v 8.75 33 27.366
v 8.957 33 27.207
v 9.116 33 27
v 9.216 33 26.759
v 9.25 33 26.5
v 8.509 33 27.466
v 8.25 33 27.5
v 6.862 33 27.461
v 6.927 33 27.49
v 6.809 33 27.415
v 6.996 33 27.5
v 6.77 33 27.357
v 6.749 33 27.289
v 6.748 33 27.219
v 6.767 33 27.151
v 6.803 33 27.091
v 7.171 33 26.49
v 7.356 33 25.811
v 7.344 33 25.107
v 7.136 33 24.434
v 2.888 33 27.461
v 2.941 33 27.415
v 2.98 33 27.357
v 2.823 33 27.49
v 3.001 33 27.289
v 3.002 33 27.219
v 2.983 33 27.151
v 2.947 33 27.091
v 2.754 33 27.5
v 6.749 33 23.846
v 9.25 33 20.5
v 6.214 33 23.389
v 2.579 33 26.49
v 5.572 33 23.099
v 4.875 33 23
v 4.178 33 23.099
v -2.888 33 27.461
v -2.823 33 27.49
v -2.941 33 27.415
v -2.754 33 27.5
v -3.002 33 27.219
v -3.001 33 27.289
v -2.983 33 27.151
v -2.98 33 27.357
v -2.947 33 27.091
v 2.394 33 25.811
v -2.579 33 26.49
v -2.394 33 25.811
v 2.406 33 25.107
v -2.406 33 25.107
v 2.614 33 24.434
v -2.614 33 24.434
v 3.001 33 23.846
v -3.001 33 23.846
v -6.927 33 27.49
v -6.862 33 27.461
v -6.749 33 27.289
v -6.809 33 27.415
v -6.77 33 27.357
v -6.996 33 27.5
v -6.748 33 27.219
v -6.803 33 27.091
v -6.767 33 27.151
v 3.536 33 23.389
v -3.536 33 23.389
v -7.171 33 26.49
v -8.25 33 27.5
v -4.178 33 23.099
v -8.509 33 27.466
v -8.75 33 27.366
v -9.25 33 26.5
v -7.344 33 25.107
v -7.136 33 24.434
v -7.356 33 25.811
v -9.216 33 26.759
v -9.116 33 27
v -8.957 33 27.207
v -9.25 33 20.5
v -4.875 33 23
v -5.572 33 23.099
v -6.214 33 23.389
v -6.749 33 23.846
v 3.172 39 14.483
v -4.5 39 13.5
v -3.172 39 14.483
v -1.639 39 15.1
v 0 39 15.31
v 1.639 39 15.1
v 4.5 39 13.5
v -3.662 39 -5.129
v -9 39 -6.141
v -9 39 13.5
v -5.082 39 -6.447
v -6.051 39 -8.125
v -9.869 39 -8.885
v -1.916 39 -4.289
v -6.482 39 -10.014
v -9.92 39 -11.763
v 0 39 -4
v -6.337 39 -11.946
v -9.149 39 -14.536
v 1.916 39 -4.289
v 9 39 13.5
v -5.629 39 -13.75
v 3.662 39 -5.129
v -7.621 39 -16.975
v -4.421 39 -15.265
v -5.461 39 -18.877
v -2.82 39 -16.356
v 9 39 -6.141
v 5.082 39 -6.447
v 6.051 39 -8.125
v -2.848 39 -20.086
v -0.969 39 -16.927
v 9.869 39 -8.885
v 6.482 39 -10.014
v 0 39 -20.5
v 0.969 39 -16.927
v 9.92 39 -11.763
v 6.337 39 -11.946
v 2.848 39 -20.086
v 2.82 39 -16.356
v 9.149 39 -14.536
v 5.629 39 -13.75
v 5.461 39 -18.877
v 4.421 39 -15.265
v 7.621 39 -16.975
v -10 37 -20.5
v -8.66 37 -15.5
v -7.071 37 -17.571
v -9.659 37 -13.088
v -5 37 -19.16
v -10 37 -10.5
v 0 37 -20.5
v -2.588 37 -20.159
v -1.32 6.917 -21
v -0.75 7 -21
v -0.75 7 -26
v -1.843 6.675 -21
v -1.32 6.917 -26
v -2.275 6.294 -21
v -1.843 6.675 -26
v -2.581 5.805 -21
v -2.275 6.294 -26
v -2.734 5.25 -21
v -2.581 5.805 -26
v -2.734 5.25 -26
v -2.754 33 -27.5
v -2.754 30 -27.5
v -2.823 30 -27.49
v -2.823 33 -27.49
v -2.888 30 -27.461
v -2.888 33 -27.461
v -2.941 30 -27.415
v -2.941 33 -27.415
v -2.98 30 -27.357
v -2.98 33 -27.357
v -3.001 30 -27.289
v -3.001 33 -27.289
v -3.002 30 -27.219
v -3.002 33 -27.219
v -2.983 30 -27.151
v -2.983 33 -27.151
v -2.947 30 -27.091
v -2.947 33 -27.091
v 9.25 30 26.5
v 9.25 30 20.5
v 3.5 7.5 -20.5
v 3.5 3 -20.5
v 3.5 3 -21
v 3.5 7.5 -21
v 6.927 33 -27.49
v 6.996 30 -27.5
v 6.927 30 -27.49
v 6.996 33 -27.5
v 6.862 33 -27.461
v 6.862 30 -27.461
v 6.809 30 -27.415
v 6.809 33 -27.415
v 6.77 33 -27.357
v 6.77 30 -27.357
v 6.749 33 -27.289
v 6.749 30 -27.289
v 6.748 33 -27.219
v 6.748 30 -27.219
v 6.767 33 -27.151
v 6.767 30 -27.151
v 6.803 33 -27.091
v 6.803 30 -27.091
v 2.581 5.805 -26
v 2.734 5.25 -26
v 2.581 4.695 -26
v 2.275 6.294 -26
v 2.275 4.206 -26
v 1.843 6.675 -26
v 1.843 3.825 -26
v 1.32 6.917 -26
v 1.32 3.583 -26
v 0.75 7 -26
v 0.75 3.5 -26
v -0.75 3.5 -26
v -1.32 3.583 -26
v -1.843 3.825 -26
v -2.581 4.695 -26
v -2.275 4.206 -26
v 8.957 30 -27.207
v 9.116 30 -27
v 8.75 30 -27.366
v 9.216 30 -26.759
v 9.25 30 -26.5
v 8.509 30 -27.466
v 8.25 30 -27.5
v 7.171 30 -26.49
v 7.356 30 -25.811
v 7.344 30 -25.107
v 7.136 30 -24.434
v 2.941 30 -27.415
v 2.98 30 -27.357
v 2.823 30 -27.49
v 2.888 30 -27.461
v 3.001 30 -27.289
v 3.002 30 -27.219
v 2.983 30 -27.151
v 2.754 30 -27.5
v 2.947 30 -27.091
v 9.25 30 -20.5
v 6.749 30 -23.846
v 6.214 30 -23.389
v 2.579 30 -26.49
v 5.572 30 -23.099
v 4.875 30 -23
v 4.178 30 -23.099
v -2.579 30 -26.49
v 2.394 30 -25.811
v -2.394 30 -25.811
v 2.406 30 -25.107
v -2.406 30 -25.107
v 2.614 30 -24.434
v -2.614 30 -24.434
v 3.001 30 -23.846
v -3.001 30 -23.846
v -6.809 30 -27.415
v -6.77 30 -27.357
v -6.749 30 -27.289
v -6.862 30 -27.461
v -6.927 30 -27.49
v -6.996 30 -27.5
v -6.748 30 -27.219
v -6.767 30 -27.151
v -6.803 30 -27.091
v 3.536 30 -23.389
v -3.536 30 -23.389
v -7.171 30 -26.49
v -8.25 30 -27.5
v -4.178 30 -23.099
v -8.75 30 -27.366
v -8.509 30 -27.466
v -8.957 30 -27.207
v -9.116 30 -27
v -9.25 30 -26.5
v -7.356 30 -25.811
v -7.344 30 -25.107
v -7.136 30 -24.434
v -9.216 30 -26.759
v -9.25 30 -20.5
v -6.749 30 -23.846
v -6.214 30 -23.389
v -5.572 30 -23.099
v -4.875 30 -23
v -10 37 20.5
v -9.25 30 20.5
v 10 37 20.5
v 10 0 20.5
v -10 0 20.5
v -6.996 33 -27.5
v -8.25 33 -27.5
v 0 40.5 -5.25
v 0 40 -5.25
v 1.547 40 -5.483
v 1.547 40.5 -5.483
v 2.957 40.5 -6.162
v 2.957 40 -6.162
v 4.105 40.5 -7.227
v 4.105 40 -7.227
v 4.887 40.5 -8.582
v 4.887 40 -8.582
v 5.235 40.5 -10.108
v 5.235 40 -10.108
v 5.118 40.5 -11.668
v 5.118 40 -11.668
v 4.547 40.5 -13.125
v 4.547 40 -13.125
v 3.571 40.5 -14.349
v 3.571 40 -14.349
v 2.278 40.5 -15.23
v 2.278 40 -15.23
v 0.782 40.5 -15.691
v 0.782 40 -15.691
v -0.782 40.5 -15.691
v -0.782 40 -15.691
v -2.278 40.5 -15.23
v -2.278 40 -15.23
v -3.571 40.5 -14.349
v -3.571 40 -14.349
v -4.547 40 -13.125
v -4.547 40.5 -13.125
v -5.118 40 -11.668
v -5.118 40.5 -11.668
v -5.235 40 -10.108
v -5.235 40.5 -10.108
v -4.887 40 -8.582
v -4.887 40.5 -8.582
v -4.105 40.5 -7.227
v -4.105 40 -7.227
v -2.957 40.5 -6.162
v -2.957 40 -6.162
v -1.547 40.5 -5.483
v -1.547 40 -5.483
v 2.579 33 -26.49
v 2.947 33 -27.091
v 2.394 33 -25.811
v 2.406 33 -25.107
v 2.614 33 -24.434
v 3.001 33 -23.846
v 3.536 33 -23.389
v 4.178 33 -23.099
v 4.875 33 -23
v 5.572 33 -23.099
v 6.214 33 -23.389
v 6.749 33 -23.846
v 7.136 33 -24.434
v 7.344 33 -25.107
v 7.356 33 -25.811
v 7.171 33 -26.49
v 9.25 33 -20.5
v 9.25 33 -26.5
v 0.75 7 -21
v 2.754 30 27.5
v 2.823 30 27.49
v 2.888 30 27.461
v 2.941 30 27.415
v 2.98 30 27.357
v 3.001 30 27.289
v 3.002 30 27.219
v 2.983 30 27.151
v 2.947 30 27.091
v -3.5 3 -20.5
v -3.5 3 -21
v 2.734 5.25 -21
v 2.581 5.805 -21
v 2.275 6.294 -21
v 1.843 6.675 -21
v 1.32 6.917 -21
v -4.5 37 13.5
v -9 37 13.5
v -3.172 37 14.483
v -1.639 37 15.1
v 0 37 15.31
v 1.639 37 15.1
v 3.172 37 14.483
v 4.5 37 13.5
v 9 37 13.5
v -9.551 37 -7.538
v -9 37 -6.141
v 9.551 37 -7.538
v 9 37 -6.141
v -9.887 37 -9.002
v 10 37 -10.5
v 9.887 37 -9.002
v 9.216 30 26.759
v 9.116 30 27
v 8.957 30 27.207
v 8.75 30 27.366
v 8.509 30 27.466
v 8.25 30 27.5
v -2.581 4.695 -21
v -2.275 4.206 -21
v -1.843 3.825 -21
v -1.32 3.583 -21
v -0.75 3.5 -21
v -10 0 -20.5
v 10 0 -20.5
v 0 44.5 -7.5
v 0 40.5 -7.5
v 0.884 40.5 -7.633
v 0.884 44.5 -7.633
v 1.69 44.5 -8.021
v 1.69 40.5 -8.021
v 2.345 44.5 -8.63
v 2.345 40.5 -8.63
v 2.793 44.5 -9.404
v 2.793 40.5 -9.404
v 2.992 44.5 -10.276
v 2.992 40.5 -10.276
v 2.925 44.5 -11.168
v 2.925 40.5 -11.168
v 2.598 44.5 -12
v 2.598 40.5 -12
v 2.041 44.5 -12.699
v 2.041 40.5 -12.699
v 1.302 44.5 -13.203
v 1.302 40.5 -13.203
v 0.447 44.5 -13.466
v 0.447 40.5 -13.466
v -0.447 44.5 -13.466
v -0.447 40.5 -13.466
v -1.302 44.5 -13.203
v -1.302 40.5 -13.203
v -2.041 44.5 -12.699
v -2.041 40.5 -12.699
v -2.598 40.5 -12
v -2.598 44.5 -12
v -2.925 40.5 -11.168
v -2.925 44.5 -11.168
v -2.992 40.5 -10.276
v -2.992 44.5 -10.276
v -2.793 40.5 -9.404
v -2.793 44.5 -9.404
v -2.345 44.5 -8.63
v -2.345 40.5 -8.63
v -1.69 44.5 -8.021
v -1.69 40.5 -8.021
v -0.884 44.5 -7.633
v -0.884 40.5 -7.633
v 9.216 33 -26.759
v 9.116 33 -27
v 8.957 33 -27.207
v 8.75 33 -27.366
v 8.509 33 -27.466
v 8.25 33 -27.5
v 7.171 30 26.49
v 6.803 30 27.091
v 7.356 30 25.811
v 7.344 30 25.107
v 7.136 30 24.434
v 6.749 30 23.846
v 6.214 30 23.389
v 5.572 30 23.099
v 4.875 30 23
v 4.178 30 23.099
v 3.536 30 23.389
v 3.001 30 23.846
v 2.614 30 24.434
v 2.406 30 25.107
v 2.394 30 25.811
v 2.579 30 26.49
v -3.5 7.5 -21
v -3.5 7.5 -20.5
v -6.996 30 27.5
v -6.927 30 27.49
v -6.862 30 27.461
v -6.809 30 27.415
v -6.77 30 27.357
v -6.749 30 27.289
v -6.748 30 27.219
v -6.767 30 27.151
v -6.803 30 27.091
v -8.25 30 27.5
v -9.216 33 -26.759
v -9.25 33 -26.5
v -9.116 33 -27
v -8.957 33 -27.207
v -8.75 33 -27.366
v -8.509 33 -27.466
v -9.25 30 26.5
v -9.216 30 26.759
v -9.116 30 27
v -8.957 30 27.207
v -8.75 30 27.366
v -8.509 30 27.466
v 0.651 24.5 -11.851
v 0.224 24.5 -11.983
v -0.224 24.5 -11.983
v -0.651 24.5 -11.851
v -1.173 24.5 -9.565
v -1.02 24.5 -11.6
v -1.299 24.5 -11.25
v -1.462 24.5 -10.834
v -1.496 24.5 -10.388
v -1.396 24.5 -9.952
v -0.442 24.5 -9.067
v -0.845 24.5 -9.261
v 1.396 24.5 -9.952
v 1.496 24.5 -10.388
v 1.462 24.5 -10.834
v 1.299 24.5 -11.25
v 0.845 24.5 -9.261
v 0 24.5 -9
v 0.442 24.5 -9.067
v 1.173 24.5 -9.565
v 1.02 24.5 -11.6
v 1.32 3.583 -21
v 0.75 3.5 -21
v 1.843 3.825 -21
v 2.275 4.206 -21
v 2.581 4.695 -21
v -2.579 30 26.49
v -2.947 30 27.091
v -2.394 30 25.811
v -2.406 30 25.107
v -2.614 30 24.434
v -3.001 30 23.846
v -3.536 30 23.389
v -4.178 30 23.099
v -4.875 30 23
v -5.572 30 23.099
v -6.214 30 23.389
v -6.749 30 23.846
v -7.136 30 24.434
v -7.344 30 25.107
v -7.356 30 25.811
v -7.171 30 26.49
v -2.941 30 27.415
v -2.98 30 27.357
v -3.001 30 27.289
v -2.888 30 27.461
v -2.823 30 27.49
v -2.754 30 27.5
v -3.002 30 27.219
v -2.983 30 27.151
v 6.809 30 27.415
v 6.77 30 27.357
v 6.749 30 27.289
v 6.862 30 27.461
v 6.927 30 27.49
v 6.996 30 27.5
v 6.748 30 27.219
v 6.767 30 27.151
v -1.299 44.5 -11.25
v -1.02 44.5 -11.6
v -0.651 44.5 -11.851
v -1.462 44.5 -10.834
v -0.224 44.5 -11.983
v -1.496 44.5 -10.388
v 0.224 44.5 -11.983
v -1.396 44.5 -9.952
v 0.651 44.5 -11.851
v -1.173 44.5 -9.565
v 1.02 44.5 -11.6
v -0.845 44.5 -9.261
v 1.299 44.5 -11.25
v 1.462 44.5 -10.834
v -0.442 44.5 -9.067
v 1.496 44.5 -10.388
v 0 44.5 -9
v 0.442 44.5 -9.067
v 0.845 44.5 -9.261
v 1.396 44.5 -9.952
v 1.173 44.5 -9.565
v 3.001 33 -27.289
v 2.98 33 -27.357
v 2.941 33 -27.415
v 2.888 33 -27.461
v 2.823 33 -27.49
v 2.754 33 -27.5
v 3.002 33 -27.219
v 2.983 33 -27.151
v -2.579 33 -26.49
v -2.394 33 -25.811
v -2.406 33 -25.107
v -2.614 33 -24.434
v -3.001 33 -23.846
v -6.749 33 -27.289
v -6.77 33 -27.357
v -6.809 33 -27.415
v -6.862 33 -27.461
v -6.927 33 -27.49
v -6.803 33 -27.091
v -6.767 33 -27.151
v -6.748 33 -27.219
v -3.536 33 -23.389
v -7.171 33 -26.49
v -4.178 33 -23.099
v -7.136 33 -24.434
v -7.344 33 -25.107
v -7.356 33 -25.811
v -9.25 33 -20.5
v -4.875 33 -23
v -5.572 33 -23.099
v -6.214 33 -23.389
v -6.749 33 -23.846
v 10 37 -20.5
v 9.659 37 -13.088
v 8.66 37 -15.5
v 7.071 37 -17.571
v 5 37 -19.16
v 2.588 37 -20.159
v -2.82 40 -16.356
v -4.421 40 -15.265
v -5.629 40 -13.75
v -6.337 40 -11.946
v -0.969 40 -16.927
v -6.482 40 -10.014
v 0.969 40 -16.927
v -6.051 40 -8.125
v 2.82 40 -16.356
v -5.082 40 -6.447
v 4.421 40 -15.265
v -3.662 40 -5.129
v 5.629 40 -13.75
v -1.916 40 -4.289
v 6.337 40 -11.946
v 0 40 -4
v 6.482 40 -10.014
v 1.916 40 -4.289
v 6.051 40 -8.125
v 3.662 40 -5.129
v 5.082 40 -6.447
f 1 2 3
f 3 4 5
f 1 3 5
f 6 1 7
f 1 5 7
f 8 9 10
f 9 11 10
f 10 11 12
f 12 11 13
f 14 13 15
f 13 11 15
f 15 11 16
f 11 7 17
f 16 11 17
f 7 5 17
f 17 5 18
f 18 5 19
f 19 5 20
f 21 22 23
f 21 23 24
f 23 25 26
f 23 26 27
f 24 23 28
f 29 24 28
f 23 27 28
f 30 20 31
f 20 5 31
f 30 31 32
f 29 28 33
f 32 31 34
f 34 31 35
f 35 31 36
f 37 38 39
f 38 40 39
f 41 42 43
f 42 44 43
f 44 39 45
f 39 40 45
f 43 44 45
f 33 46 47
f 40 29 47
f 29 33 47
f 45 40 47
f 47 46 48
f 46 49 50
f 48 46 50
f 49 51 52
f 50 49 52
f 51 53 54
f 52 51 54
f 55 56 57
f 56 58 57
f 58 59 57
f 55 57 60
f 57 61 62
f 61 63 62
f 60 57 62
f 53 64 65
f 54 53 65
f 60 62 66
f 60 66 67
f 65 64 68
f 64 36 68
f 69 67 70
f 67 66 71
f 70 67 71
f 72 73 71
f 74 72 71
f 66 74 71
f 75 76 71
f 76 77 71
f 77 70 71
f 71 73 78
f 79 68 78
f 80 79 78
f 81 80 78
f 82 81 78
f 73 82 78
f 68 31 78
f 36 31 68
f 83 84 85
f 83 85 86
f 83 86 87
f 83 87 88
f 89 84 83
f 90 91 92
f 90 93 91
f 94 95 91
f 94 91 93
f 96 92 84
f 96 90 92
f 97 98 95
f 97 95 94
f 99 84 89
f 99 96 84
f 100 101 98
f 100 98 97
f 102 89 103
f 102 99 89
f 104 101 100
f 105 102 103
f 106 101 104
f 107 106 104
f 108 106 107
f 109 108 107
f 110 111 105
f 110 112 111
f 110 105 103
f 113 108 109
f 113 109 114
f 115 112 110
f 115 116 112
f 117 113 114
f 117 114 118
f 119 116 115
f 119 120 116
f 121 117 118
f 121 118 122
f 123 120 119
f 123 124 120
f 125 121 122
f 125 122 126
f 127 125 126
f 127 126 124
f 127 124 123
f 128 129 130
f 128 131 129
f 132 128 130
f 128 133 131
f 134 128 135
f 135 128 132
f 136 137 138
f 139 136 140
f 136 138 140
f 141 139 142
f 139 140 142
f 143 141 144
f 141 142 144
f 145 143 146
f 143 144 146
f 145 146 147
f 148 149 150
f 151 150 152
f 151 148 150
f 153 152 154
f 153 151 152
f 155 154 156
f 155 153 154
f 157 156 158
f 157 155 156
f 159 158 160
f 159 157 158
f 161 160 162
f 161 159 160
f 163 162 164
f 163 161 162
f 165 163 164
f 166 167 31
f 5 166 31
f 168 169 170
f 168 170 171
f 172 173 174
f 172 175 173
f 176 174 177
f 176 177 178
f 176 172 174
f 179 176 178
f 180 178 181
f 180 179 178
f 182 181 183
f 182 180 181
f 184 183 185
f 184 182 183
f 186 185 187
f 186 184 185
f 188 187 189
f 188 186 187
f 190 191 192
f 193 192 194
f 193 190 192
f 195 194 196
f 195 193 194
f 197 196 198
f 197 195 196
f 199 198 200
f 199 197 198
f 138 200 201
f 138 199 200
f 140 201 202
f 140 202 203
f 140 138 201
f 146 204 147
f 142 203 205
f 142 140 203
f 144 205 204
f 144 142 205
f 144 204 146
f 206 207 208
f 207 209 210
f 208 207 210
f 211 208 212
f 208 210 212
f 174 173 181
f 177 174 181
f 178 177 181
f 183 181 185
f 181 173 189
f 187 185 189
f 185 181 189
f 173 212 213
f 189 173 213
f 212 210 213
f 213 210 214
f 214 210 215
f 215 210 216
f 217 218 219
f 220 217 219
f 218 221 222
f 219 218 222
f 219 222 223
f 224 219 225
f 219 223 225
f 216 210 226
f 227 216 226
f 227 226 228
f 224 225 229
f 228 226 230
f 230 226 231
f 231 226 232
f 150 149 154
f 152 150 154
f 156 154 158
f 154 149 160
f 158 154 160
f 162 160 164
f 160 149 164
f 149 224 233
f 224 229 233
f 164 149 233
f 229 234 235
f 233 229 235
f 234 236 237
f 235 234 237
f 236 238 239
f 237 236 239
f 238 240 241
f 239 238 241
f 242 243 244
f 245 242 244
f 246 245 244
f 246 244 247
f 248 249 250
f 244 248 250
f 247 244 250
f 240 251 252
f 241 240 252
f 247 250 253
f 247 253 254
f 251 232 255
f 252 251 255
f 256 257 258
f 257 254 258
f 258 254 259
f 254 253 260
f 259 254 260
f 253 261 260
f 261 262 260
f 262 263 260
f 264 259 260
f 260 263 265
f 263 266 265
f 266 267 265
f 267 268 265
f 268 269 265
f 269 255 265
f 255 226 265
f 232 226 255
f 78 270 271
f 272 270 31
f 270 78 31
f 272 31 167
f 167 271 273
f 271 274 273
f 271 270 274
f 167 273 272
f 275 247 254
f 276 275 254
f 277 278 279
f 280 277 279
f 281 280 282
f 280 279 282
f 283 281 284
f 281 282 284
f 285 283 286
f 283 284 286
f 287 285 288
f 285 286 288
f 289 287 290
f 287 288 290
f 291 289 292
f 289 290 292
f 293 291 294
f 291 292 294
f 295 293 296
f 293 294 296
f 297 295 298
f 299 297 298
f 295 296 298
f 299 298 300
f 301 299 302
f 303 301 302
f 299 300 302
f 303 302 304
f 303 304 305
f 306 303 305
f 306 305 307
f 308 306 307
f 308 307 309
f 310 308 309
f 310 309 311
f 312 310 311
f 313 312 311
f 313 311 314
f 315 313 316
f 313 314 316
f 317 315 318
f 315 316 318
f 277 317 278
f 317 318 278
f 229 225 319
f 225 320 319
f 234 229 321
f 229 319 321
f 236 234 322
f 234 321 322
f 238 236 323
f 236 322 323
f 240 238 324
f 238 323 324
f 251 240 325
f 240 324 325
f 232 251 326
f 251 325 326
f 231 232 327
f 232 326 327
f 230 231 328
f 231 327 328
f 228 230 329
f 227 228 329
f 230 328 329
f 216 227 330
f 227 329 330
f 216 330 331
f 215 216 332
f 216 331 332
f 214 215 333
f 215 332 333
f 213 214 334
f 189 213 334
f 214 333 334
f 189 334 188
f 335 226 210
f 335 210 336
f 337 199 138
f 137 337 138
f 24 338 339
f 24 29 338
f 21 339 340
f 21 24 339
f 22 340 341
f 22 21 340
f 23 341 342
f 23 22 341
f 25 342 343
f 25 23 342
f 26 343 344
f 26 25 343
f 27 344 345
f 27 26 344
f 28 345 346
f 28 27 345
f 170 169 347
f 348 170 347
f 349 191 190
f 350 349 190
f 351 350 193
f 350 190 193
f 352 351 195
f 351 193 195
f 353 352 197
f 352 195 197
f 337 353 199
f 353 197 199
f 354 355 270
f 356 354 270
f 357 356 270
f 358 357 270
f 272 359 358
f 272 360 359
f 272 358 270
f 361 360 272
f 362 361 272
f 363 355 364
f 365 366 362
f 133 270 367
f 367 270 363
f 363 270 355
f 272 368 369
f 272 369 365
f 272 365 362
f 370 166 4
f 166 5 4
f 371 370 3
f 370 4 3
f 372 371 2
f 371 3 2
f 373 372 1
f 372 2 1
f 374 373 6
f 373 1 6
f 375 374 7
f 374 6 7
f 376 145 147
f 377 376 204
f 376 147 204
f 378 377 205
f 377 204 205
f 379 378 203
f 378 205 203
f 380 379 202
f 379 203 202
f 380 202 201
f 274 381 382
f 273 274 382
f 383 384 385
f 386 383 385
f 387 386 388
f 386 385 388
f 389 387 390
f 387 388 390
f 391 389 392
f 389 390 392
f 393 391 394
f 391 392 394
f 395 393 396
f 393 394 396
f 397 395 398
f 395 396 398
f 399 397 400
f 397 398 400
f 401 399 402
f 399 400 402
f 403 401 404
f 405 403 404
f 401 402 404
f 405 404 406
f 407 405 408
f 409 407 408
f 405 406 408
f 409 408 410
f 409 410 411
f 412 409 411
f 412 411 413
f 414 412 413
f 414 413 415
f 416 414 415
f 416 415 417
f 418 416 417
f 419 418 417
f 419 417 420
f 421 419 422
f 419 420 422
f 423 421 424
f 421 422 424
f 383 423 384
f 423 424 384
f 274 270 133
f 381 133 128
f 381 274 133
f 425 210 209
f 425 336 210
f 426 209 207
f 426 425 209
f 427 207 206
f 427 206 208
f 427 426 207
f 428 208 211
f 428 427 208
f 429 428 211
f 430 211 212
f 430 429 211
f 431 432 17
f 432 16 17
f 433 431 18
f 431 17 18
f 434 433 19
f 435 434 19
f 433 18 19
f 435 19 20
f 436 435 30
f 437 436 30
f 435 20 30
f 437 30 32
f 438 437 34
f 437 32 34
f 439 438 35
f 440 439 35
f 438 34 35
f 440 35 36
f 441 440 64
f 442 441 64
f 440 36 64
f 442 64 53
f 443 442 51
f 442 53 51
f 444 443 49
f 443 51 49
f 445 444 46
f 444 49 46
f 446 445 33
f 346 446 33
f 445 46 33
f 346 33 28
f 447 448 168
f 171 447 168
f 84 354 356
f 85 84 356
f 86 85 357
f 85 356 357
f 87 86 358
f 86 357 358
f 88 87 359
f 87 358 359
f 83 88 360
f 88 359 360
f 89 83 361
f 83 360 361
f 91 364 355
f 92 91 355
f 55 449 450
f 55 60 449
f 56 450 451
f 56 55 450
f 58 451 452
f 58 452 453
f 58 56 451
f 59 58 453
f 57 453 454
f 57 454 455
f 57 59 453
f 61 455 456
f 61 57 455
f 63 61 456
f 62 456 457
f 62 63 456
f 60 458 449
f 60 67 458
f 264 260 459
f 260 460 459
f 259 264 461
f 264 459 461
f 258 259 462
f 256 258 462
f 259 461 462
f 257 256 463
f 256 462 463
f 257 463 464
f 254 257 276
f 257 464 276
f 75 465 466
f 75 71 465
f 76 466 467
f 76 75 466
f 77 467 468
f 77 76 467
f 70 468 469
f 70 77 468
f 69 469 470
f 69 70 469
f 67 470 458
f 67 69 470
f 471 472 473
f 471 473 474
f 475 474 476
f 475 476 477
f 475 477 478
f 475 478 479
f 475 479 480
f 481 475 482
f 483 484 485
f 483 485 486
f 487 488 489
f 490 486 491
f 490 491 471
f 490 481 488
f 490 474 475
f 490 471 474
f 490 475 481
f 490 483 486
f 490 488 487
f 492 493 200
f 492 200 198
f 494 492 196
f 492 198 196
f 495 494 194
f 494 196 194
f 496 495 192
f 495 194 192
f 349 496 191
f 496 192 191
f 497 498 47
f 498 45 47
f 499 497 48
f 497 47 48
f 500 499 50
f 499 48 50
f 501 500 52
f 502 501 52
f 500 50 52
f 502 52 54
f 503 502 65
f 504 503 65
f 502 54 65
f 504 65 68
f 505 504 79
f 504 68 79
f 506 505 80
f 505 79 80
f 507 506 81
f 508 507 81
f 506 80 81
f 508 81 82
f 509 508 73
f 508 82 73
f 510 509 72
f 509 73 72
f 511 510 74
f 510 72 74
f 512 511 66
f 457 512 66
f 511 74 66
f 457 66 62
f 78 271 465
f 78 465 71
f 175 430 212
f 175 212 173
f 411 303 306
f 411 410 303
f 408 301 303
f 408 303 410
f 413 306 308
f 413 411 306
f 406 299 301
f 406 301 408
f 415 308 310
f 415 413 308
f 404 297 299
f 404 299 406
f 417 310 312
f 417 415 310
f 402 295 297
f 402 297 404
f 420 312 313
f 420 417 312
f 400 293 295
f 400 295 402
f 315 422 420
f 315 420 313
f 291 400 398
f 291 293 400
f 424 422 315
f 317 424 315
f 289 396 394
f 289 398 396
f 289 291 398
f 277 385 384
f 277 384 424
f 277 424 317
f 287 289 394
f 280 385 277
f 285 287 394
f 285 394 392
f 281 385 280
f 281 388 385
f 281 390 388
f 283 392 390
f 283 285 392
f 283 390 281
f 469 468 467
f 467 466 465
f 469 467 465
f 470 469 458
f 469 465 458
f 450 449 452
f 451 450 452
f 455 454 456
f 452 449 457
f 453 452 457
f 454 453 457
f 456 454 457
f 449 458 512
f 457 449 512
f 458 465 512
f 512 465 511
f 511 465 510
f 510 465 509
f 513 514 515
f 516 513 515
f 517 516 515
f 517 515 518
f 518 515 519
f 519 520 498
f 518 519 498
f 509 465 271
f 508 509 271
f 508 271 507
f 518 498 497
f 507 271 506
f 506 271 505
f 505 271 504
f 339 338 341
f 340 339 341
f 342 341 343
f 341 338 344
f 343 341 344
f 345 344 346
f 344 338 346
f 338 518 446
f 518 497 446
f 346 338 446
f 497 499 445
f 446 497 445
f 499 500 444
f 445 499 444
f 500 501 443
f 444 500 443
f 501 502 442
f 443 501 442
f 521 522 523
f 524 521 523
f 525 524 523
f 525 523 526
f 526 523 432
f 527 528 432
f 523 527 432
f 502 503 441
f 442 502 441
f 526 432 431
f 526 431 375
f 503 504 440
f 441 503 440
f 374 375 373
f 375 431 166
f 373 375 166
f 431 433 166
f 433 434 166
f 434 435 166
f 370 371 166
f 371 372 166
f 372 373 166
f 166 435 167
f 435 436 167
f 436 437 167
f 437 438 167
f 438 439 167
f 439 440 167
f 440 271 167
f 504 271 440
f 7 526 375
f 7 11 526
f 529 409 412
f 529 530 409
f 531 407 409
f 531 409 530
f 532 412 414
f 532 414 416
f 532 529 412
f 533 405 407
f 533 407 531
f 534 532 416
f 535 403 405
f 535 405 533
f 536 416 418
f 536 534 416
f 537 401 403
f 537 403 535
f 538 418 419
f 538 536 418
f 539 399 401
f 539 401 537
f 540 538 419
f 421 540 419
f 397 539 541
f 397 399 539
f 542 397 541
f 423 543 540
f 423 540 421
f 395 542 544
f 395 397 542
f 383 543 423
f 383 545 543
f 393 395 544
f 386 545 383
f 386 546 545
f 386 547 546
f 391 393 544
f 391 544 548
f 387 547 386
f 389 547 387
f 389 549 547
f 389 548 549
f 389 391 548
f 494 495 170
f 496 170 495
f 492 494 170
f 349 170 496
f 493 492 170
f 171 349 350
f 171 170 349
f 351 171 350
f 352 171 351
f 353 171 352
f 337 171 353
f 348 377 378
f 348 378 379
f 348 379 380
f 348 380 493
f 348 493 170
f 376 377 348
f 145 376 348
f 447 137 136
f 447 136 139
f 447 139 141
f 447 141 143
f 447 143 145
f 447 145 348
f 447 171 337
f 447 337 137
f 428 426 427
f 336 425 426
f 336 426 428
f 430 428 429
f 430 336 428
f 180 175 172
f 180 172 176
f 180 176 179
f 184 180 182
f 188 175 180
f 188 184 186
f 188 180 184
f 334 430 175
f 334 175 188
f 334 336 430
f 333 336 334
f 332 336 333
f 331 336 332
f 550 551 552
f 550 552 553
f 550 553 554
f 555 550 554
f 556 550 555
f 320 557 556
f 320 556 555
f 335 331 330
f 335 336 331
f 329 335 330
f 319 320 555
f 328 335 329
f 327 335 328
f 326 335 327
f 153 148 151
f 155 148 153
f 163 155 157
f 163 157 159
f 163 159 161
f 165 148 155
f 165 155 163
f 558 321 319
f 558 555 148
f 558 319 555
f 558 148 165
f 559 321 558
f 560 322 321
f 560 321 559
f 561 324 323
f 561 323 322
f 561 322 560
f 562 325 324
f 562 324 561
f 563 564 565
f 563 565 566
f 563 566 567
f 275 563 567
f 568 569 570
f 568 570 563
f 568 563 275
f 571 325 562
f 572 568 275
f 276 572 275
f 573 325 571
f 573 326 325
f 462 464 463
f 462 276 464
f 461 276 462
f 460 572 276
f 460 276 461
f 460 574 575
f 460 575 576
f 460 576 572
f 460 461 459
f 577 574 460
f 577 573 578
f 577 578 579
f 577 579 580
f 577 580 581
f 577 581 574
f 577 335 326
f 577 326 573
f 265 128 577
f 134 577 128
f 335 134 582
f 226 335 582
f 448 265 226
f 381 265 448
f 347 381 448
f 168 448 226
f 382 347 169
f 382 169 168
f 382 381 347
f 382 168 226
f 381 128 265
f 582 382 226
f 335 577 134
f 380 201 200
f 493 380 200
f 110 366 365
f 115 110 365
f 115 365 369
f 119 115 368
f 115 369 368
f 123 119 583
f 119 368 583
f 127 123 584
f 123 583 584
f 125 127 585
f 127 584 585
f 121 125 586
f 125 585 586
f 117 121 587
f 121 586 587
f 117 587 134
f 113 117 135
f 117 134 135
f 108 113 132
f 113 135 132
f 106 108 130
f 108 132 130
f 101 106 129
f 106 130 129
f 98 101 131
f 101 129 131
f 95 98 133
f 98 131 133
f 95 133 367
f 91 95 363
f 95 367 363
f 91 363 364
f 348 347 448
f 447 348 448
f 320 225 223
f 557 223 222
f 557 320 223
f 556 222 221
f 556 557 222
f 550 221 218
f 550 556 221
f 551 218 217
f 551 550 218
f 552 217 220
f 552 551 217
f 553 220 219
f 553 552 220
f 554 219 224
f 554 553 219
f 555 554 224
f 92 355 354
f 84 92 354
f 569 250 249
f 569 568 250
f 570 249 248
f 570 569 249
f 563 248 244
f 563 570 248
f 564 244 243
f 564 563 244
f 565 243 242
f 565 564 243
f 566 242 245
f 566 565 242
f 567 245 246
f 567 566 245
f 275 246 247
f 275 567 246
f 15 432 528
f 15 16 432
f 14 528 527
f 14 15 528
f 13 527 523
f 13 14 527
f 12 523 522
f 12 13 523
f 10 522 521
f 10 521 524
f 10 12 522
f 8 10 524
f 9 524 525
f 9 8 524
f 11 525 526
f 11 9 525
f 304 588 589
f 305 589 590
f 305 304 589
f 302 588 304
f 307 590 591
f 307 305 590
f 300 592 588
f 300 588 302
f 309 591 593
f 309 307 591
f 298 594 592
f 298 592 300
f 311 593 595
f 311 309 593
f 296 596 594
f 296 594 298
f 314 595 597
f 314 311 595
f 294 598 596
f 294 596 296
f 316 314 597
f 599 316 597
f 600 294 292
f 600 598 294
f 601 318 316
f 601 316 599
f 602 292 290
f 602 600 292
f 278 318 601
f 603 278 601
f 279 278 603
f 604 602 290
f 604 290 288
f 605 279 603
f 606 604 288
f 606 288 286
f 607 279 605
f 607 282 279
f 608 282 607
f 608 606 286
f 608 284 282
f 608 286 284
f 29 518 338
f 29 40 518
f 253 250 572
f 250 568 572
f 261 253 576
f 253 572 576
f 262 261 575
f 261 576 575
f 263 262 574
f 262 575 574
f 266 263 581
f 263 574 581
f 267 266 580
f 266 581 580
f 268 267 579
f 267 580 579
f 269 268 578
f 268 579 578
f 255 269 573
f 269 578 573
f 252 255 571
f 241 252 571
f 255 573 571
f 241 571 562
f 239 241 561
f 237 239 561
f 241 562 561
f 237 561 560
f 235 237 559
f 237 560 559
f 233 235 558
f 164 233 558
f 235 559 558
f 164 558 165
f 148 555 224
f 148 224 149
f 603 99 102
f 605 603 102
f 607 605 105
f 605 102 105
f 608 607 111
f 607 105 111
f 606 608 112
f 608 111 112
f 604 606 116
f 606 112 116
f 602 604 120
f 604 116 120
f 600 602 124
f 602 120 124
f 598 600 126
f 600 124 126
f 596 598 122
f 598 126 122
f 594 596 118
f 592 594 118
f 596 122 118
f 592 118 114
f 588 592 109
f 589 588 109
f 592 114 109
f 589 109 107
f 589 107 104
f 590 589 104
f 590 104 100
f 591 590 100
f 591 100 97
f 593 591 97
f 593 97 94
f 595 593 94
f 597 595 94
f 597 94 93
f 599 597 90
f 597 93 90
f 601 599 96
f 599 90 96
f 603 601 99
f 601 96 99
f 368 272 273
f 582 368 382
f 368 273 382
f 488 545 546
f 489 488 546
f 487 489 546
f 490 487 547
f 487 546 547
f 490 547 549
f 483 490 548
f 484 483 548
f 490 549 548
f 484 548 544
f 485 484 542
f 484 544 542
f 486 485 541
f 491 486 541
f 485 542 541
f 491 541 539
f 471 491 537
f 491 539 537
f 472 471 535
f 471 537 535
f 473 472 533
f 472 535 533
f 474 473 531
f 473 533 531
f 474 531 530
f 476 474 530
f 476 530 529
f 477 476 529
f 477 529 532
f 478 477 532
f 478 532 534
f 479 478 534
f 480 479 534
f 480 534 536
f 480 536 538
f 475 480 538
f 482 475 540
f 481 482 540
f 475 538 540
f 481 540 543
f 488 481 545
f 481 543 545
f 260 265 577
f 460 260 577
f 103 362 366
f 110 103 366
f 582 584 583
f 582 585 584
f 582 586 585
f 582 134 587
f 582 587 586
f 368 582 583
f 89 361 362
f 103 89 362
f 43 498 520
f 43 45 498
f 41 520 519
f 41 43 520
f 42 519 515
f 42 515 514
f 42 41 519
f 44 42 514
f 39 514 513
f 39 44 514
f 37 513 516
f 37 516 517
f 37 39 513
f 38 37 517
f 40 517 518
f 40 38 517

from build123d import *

# Parameters (mm, degrees)
SKETCH1_W           = 20
SKETCH1_H           = 41
BOSS_EXTRUDE1_DEPTH = 37
BOSS_EXTRUDE2_DEPTH = 2
SKETCH3_R           = 6.5
BOSS_EXTRUDE3_DEPTH = 1
SKETCH4_R           = 5.25
BOSS_EXTRUDE4_DEPTH = 0.5
SKETCH5_R           = 3
BOSS_EXTRUDE5_DEPTH = 4
SKETCH6_W           = 3.5
SKETCH6_H           = 4.5
BOSS_EXTRUDE6_DEPTH = 5.5
CUT_EXTRUDE1_DEPTH  = 5
SKETCH8_W           = 9.25
SKETCH8_H           = 3
BOSS_EXTRUDE7_DEPTH = 7
SKETCH9_W           = 18.5
SKETCH9_H           = 3
BOSS_EXTRUDE8_DEPTH = 7
FILLET1_R           = 1
SKETCH10_R          = 2.5
CUT_EXTRUDE2_DEPTH  = 7
SKETCH11_R          = 1.5
CUT_EXTRUDE3_DEPTH  = 20
FILLET2_R           = 0.25
FILLET3_R           = 2


with BuildPart() as part:
    # Sketch1 → Boss-Extrude1 (new body)
    with BuildSketch(Plane(origin=(0, 0, 0), x_dir=(1, 0, 0), z_dir=(0, 1, 0))):
        Rectangle(SKETCH1_W, SKETCH1_H)
    extrude(amount=BOSS_EXTRUDE1_DEPTH)

    # Sketch2 → Boss-Extrude2 (add)
    with BuildSketch(Plane(origin=(0, 37, 0), x_dir=(1, 0, 0), z_dir=(0, 1, 0))):
        with BuildLine():
            Line((-9, 6.141101056), (-9, -13.5))
            Line((-9, -13.5), (-4.5, -13.5))
            ThreePointArc((-4.5, -13.5), (0, -15.30958424), (4.5, -13.5))
            Line((4.5, -13.5), (9, -13.5))
            Line((9, -13.5), (9, 6.141101056))
            ThreePointArc((9, 6.141101056), (0, 20.5), (-9, 6.141101056))
        make_face()
    extrude(amount=BOSS_EXTRUDE2_DEPTH)

    # Sketch3 → Boss-Extrude3 (add)
    with BuildSketch(Plane(origin=(0, 39, 0), x_dir=(1, 0, 0), z_dir=(0, 1, 0))):
        with Locations(Location((0, 10.5, 0), (0, 0, 270))):
            Circle(SKETCH3_R)
    extrude(amount=BOSS_EXTRUDE3_DEPTH)

    # Sketch4 → Boss-Extrude4 (add)
    with BuildSketch(Plane(origin=(0, 40, 0), x_dir=(1, 0, 0), z_dir=(0, 1, 0))):
        with Locations(Location((0, 10.5, 0), (0, 0, 270))):
            Circle(SKETCH4_R)
    extrude(amount=BOSS_EXTRUDE4_DEPTH)

    # Sketch5 → Boss-Extrude5 (add)
    with BuildSketch(Plane(origin=(0, 40.5, 0), x_dir=(1, 0, 0), z_dir=(0, 1, 0))):
        with Locations(Location((0, 10.5, 0), (0, 0, 270))):
            Circle(SKETCH5_R)
    extrude(amount=BOSS_EXTRUDE5_DEPTH)

    # Sketch6 → Boss-Extrude6 (add)
    with BuildSketch(Plane(origin=(0, 0, -20.5), x_dir=(-1, 0, 0), z_dir=(0, 0, -1))):
        with Locations((-1.75, 5.25)):
            Rectangle(SKETCH6_W, SKETCH6_H)
        with Locations((1.75, 5.25)):
            Rectangle(SKETCH6_W, SKETCH6_H)
    extrude(amount=BOSS_EXTRUDE6_DEPTH)

    # Sketch7 → Cut-Extrude1 (cut)
    with BuildSketch(Plane(origin=(0, 0, -26), x_dir=(-1, 0, 0), z_dir=(0, 0, -1))):
        Polygon((3.5, 7.5), (0, 7.5), (0, 7), (2.75, 7), (2.75, 3.5), (0, 3.5), (0, 3), (3.5, 3), align=None)
        Polygon((0, 7), (0, 7.5), (-3.5, 7.5), (-3.5, 3), (0, 3), (0, 3.5), (-2.75, 3.5), (-2.75, 7), align=None)
    extrude(amount=-CUT_EXTRUDE1_DEPTH, mode=Mode.SUBTRACT)

    # Sketch8 → Boss-Extrude7 (add)
    with BuildSketch(Plane.XY.offset(20.5)):
        with Locations((4.625, 31.5)):
            Rectangle(SKETCH8_W, SKETCH8_H)
        with Locations((-4.625, 31.5)):
            Rectangle(SKETCH8_W, SKETCH8_H)
    extrude(amount=BOSS_EXTRUDE7_DEPTH)

    # Sketch9 → Boss-Extrude8 (add)
    with BuildSketch(Plane(origin=(0, 0, -20.5), x_dir=(-1, 0, 0), z_dir=(0, 0, -1))):
        with Locations((0, 31.5)):
            Rectangle(SKETCH9_W, SKETCH9_H)
    extrude(amount=BOSS_EXTRUDE8_DEPTH)

    # Fillet1
    fillet1_edges = [part.edges().sort_by_distance(p)[0] for p in [
        (-9.25, 31.5, -27.5),
        (9.25, 31.5, -27.5),
        (-9.25, 31.5, 27.5),
        (9.25, 31.5, 27.5),
    ]]
    fillet(fillet1_edges, radius=FILLET1_R)

    # Sketch10 → Cut-Extrude2 (cut)
    with BuildSketch(Plane(origin=(0, 33, 0), x_dir=(1, 0, 0), z_dir=(0, 1, 0))):
        with Locations((-4.875, 25.5)):
            Circle(SKETCH10_R)
        with Locations((4.875, 25.5)):
            Circle(SKETCH10_R)
        with Locations((4.875, -25.5)):
            Circle(SKETCH10_R)
        with Locations((-4.875, -25.5)):
            Circle(SKETCH10_R)
    extrude(amount=-CUT_EXTRUDE2_DEPTH, mode=Mode.SUBTRACT)

    # Sketch11 → Cut-Extrude3 (cut)
    with BuildSketch(Plane(origin=(0, 44.5, 0), x_dir=(1, 0, 0), z_dir=(0, 1, 0))):
        with Locations(Location((0, 10.5, 0), (0, 0, 270))):
            Circle(SKETCH11_R)
    extrude(amount=-CUT_EXTRUDE3_DEPTH, mode=Mode.SUBTRACT)

    # Fillet2
    fillet2_edges = [part.edges().sort_by_distance(p)[0] for p in [
        (-3.375, 31.5, -27.5),
        (-6.375, 31.5, -27.5),
        (6.375, 31.5, -27.5),
        (3.375, 31.5, -27.5),
        (3.375, 31.5, 27.5),
        (6.375, 31.5, 27.5),
        (-6.375, 31.5, 27.5),
        (-3.375, 31.5, 27.5),
    ]]
    fillet(fillet2_edges, radius=FILLET2_R)

    # Fillet3
    # the kernel refuses this fillet: 2 mm, written as the material it takes off along each edge
    with BuildSketch(Plane(origin=(2.75, 7, -31), x_dir=(-1, 0, 0), z_dir=(0, 0, 1))) as fillet3_piece_1:
        with BuildLine():
            CenterArc((FILLET3_R, FILLET3_R), FILLET3_R, 180, 90)
            Line((0, FILLET3_R), (0, 0))
            Line((0, 0), (FILLET3_R, 0))
        make_face()
    extrude(amount=10, mode=Mode.SUBTRACT)
    with BuildSketch(Plane(origin=(-2.75, 7, -31), x_dir=(1, 0, 0), z_dir=(0, 0, 1)), Plane(origin=(-2.75, 3.5, -31), x_dir=(0, 1, 0), z_dir=(0, 0, 1)), Plane(origin=(2.75, 3.5, -31), x_dir=(-1, 0, 0), z_dir=(0, 0, 1))) as fillet3_piece_2:
        with BuildLine():
            CenterArc((FILLET3_R, -FILLET3_R), FILLET3_R, 90, 90)
            Line((0, -FILLET3_R), (0, 0))
            Line((0, 0), (FILLET3_R, 0))
        make_face()
    extrude(amount=10, mode=Mode.SUBTRACT)


solid = part.part
